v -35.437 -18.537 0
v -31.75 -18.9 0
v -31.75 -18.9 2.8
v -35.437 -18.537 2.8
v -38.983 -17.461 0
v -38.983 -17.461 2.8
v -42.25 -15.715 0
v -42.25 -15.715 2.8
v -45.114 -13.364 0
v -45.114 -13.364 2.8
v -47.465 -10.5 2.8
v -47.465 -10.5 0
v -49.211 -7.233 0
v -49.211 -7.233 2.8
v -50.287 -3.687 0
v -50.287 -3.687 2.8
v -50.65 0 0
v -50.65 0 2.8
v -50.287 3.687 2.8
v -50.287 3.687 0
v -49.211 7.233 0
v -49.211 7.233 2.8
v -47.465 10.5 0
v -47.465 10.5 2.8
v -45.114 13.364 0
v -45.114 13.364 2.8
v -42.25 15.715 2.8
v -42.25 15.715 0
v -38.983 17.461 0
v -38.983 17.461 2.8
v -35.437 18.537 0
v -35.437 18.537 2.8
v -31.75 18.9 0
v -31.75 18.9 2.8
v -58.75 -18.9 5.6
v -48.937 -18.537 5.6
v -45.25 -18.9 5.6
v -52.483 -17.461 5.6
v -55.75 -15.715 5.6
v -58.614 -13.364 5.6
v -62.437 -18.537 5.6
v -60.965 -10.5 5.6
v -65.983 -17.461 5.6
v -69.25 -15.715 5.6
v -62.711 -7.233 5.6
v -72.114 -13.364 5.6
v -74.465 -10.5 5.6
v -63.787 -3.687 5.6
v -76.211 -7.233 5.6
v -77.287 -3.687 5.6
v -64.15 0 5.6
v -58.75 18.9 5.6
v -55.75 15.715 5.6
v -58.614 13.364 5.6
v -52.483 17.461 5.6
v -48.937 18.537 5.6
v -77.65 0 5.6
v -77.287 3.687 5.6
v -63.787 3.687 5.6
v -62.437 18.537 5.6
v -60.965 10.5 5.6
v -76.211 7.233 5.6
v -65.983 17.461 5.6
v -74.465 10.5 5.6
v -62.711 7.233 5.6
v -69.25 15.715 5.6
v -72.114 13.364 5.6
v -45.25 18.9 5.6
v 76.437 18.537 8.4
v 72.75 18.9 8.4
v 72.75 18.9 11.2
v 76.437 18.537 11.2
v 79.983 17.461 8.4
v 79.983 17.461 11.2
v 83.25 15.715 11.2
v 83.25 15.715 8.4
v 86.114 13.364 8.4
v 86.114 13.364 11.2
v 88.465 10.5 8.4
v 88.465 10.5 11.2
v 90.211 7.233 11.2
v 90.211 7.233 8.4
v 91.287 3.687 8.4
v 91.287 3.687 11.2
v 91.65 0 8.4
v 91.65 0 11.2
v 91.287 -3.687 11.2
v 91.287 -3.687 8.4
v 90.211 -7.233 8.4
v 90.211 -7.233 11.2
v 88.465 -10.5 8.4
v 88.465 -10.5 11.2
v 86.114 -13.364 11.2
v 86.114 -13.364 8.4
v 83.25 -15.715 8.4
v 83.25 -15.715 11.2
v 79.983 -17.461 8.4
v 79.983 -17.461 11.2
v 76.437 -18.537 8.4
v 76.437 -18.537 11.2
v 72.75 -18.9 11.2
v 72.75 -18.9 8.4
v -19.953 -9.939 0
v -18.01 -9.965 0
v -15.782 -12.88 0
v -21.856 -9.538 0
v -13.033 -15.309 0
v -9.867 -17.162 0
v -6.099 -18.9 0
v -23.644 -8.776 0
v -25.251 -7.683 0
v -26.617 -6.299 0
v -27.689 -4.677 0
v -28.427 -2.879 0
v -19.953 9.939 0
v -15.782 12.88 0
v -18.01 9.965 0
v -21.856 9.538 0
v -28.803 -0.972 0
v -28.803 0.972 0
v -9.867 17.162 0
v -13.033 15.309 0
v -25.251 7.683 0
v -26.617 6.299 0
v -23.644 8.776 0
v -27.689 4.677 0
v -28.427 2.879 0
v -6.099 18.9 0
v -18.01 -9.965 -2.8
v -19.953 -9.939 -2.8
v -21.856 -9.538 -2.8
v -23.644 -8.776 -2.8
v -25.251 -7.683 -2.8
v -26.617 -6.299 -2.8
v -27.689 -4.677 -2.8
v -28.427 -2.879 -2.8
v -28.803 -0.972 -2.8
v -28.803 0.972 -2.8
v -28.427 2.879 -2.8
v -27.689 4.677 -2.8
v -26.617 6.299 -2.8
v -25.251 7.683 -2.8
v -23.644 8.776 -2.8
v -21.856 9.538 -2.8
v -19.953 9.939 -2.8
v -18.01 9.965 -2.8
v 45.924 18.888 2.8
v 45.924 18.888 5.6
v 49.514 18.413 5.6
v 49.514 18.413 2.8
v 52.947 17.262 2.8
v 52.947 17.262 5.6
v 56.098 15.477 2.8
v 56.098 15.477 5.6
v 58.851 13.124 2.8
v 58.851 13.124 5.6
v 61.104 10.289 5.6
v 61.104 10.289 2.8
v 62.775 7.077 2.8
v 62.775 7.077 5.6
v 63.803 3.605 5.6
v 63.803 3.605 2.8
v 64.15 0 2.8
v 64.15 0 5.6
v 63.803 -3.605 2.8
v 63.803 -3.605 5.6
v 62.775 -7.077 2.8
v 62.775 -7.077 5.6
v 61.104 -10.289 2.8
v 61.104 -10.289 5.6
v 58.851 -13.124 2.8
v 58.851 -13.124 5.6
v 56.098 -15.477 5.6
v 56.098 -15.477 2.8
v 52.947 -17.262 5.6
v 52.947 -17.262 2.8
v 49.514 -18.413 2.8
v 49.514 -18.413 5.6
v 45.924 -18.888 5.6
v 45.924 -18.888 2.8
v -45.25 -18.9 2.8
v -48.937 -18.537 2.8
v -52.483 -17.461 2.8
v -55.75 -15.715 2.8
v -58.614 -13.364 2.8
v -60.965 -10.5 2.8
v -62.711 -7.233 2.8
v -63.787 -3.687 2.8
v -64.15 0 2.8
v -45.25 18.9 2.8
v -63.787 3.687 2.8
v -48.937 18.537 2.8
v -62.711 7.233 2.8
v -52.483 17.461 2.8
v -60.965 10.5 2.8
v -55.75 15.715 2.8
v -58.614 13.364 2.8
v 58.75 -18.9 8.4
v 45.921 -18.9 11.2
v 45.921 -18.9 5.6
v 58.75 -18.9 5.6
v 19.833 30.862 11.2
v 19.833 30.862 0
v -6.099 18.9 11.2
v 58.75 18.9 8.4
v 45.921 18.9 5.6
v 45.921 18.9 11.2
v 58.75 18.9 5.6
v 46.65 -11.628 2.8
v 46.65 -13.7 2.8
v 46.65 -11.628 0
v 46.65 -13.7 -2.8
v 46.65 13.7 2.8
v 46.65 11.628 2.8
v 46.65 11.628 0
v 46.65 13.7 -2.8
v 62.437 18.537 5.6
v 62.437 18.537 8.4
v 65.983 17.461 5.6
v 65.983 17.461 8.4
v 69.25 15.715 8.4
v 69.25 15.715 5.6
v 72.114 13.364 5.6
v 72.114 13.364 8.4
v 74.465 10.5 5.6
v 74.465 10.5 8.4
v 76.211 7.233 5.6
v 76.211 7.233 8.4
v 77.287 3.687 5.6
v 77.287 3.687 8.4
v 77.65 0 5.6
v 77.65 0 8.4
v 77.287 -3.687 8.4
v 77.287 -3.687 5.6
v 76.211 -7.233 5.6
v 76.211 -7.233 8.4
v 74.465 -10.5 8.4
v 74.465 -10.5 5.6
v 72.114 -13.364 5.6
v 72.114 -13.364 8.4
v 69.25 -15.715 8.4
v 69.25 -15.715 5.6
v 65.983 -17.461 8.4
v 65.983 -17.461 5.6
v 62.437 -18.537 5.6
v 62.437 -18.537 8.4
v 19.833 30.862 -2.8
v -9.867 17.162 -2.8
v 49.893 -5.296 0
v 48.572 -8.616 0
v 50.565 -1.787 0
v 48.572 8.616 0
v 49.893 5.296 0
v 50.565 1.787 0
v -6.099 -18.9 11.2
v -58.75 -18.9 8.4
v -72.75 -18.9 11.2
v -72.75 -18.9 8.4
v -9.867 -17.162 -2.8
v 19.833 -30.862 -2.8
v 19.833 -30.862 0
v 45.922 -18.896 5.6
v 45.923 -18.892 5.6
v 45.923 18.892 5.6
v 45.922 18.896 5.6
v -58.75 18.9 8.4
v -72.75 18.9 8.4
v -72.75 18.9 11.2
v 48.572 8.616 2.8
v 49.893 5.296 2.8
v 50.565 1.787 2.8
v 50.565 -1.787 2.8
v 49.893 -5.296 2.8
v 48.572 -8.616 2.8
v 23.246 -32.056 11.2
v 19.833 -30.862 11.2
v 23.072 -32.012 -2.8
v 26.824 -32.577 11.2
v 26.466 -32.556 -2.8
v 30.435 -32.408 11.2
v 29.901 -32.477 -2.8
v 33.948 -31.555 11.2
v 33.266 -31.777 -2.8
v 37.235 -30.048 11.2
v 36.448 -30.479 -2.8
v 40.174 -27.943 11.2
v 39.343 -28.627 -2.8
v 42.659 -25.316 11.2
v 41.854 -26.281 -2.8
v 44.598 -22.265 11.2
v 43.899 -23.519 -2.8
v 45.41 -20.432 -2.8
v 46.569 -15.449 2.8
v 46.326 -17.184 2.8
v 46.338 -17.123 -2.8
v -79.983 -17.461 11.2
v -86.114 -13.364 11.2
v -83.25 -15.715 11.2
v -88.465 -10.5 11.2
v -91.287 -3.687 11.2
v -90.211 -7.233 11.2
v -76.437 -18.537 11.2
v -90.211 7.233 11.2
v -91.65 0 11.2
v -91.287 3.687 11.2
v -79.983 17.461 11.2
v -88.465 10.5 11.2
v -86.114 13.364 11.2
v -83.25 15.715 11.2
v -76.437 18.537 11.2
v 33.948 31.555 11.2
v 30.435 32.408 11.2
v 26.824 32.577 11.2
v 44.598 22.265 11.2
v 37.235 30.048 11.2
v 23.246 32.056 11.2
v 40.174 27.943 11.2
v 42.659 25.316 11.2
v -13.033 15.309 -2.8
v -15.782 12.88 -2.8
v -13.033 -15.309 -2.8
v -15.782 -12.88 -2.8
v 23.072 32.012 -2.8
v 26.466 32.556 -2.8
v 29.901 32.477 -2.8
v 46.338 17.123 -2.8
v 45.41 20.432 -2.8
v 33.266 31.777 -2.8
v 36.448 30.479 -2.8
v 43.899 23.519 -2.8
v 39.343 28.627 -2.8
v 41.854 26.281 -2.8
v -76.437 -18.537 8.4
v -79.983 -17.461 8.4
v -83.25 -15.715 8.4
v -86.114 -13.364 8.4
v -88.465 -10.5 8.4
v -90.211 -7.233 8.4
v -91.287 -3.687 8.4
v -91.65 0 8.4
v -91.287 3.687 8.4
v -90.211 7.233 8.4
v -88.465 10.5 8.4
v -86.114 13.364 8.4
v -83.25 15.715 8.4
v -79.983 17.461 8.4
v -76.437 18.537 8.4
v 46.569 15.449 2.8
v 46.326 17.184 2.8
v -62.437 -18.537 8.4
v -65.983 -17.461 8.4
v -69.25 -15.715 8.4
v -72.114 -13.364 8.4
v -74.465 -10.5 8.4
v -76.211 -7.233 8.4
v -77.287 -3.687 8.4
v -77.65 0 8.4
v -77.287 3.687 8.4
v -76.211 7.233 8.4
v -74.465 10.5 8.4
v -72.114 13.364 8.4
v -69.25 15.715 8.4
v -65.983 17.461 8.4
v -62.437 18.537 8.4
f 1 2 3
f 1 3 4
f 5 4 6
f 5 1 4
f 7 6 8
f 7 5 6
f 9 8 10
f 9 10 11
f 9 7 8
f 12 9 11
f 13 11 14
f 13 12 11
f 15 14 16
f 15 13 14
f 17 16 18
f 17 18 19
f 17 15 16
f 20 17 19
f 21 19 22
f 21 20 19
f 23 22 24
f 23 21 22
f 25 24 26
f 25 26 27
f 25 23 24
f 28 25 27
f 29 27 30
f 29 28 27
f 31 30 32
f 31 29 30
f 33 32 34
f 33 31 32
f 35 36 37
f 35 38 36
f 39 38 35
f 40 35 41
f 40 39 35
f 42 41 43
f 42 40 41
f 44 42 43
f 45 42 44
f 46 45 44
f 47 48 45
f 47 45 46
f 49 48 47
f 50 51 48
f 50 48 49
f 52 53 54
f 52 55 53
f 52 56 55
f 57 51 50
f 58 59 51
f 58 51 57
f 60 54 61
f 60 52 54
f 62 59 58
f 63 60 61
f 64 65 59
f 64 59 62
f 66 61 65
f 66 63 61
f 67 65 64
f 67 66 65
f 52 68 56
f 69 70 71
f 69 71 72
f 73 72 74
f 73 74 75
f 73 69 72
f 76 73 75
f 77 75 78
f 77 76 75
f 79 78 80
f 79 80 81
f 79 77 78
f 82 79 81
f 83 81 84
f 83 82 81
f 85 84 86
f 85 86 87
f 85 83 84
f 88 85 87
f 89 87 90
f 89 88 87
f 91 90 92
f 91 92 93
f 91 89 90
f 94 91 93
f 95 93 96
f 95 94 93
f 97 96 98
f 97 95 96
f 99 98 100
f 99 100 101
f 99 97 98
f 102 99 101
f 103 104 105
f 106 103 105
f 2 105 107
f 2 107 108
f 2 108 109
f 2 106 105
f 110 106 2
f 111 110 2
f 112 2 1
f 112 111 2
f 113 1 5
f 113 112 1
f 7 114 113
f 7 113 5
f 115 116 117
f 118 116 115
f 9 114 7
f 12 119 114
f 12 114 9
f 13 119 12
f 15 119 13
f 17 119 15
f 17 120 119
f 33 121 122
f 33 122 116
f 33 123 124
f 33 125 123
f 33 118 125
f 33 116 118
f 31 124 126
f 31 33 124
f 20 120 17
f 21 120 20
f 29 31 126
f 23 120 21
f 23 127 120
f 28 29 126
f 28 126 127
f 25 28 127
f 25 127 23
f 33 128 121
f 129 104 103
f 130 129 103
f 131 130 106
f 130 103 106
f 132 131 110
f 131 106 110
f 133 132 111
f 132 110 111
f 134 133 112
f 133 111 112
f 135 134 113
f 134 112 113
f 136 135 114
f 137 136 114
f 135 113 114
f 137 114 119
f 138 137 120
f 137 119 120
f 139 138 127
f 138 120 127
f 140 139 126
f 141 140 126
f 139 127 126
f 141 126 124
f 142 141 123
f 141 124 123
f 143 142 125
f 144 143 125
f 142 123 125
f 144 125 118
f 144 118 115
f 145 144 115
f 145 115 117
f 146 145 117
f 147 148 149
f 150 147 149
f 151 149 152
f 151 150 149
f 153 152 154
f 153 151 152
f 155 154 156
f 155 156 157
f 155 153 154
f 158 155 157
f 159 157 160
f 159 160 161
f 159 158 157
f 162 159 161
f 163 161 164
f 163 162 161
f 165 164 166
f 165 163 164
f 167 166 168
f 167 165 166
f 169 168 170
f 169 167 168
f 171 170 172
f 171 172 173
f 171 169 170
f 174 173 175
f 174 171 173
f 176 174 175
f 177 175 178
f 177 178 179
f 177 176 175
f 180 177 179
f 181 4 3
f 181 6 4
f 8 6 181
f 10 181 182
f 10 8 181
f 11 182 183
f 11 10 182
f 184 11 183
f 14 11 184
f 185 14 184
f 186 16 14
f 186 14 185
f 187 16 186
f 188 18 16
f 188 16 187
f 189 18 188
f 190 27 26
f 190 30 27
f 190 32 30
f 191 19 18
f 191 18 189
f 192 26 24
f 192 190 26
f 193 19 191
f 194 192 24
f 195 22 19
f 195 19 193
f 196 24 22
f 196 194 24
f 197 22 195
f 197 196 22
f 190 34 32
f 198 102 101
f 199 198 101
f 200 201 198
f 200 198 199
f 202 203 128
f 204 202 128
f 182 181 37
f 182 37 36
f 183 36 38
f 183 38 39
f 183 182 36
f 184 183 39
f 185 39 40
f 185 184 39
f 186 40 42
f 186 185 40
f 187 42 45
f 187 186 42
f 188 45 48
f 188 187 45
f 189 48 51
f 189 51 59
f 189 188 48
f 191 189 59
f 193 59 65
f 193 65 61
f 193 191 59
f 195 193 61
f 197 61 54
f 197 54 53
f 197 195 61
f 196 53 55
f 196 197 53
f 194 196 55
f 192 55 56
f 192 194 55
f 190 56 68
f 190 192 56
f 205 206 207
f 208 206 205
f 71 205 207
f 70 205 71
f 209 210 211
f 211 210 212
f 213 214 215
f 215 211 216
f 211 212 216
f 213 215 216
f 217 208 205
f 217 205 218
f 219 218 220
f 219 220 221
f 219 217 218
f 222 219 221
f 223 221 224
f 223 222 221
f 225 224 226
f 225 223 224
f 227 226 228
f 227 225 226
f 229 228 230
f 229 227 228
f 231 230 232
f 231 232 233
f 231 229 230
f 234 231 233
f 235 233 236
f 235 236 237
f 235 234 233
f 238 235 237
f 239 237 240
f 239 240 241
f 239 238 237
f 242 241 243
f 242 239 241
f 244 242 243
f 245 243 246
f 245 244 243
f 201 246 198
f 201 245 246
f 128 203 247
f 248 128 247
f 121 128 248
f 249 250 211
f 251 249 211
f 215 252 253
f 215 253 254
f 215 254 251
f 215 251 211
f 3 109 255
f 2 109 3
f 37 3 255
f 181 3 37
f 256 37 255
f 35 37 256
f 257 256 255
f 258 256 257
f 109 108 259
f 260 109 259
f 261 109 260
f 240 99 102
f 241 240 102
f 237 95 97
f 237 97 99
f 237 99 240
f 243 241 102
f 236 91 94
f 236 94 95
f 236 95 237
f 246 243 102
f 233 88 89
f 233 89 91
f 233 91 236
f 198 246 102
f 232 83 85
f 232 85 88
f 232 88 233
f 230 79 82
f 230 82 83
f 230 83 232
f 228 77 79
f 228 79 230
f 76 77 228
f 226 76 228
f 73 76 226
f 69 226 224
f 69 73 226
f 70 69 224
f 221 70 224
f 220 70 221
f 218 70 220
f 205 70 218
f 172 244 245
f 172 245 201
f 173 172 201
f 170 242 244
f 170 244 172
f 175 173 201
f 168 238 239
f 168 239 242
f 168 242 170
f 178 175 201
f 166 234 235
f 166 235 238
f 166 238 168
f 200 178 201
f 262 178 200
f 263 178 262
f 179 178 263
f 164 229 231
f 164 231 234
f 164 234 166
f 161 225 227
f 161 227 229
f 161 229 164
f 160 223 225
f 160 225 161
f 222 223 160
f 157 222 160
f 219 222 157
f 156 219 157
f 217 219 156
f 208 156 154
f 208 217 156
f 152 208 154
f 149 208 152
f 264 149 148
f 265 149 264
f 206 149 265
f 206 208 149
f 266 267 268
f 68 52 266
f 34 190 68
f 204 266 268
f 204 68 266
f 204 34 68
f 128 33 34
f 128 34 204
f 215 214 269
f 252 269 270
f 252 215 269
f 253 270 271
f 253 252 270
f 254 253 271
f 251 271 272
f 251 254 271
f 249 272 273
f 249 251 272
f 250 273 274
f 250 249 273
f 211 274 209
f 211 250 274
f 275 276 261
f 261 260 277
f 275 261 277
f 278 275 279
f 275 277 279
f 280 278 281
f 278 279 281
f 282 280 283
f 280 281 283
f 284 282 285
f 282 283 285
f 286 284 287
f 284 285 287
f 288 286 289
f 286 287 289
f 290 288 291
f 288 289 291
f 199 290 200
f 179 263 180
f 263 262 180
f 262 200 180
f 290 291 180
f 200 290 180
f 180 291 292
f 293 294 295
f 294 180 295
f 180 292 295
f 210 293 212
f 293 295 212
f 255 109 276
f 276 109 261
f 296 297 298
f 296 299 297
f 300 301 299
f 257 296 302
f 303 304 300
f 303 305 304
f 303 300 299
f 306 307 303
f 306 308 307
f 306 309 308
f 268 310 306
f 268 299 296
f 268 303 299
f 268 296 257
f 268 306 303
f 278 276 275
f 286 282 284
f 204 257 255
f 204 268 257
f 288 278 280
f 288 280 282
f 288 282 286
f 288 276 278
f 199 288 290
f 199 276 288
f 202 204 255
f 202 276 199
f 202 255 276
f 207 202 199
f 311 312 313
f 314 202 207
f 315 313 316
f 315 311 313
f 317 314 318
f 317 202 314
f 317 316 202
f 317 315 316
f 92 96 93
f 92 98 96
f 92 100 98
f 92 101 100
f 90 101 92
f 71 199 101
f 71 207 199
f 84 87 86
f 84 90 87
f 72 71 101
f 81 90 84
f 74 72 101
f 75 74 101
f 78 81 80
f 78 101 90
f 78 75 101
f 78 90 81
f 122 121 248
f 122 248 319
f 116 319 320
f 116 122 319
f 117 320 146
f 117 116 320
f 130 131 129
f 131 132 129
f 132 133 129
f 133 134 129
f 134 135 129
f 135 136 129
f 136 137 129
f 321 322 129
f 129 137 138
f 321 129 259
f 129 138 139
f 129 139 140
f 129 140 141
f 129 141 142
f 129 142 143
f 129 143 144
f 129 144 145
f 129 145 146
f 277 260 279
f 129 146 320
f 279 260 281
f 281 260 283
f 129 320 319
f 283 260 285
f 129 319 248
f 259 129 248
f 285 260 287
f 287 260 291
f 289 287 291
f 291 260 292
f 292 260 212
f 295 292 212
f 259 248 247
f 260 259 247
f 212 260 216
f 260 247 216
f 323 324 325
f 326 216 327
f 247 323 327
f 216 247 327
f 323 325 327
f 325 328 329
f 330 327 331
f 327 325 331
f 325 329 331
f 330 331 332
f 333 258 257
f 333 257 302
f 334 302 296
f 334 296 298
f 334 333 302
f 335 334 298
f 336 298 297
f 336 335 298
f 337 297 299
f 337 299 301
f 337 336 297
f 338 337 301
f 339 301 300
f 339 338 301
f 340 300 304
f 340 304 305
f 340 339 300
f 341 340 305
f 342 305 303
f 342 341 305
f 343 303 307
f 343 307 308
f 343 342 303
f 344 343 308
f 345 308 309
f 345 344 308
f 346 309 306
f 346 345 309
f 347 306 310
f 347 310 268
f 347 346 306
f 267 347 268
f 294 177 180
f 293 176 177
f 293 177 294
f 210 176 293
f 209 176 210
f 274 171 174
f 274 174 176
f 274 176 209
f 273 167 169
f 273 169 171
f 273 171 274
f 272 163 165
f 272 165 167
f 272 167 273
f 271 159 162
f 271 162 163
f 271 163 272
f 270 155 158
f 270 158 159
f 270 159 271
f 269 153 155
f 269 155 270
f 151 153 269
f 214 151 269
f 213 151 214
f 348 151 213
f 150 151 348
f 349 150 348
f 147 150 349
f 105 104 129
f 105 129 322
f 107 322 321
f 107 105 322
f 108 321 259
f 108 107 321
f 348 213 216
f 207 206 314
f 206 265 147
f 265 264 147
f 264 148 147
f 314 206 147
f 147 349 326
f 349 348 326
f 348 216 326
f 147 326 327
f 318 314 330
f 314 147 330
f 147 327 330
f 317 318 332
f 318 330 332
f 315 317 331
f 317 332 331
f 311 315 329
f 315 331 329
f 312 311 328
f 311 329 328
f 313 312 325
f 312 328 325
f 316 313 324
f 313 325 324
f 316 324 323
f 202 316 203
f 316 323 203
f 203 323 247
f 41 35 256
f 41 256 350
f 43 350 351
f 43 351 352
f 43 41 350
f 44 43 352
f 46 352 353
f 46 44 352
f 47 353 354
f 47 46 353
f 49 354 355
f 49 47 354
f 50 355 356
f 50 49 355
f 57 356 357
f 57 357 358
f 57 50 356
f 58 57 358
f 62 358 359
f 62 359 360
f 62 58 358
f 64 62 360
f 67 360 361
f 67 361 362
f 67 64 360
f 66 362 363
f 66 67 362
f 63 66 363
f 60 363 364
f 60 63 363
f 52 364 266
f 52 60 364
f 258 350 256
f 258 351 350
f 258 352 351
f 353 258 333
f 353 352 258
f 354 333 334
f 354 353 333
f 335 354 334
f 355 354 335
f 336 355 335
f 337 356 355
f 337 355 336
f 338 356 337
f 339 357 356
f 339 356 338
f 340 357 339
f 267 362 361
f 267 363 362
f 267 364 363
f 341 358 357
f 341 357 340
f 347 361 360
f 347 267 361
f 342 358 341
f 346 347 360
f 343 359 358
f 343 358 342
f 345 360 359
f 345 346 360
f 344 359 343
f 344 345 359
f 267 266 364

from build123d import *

# Parameters (mm, degrees)
BOSS_EXTRUDE1_DEPTH = 2.8
BOSS_EXTRUDE5_DEPTH = 2.8
BOSS_EXTRUDE2_DEPTH = 2.8
BOSS_EXTRUDE3_DEPTH = 2.8
BOSS_EXTRUDE4_DEPTH = 2.8
BOSS_EXTRUDE6_DEPTH = 11.2
BOSS_EXTRUDE7_START = -2.8
BOSS_EXTRUDE7_DEPTH = 2.8


with BuildPart() as part:
    # Sketch1 → Boss-Extrude1 (new body)
    with BuildSketch(Plane.XY):
        with BuildLine():
            Line((-31.75, 18.9), (31.75, 18.9))
            ThreePointArc((31.75, 18.9), (50.65, 0), (31.75, -18.9))
            Line((31.75, -18.9), (-31.75, -18.9))
            ThreePointArc((-31.75, -18.9), (-50.65, 0), (-31.75, 18.9))
        make_face()
    extrude(amount=BOSS_EXTRUDE1_DEPTH)

    # Sketch5 → Boss-Extrude5 (add)
    with BuildSketch(Plane(origin=(0, 0, 0), x_dir=(-1, 0, 0), z_dir=(0, 0, -1))):
        with BuildLine():
            Line((-46.65, -13.7), (-46.65, 13.7))
            ThreePointArc((-46.65, 13.7), (-37.937921505, 29.619053219), (-19.833465037, 30.862123242))
            Line((-19.833465037, 30.862123242), (9.866534963, 17.162123242))
            ThreePointArc((9.866534963, 17.162123242), (20.85, 0), (9.866534963, -17.162123242))
            Line((9.866534963, -17.162123242), (-19.833465037, -30.862123242))
            ThreePointArc((-19.833465037, -30.862123242), (-37.937921505, -29.619053219), (-46.65, -13.7))
        make_face()
    extrude(amount=BOSS_EXTRUDE5_DEPTH)

    # Sketch2 → Boss-Extrude2 (add)
    with BuildSketch(Plane.XY.offset(2.8)):
        with BuildLine():
            Line((-45.25, 18.9), (45.25, 18.9))
            ThreePointArc((45.25, 18.9), (64.15, 0), (45.25, -18.9))
            Line((45.25, -18.9), (-45.25, -18.9))
            ThreePointArc((-45.25, -18.9), (-64.15, 0), (-45.25, 18.9))
        make_face()
    extrude(amount=BOSS_EXTRUDE2_DEPTH)

    # Sketch3 → Boss-Extrude3 (add)
    with BuildSketch(Plane.XY.offset(5.6)):
        with BuildLine():
            Line((-58.75, 18.9), (58.75, 18.9))
            ThreePointArc((58.75, 18.9), (77.65, 0), (58.75, -18.9))
            Line((58.75, -18.9), (-58.75, -18.9))
            ThreePointArc((-58.75, -18.9), (-77.65, 0), (-58.75, 18.9))
        make_face()
    extrude(amount=BOSS_EXTRUDE3_DEPTH)

    # Sketch4 → Boss-Extrude4 (add)
    with BuildSketch(Plane.XY.offset(8.4)):
        with BuildLine():
            Line((-72.75, 18.9), (72.75, 18.9))
            ThreePointArc((72.75, 18.9), (91.65, 0), (72.75, -18.9))
            Line((72.75, -18.9), (-72.75, -18.9))
            ThreePointArc((-72.75, -18.9), (-91.65, 0), (-72.75, 18.9))
        make_face()
    extrude(amount=BOSS_EXTRUDE4_DEPTH)

    # Sketch7 → Boss-Extrude6 (add)
    with BuildSketch(Plane.XY):
        with BuildLine():
            Line((31.75, -18.9), (-6.099021116, -18.9))
            Line((-6.099021116, -18.9), (19.833465037, -30.862123242))
            ThreePointArc((19.833465037, -30.862123242), (37.937921505, -29.619053219), (46.65, -13.7))
            Line((46.65, -13.7), (46.65, -11.627553483))
            ThreePointArc((46.65, -11.627553483), (40.040031338, -16.984857386), (31.75, -18.9))
        make_face()
        with BuildLine():
            Line((46.65, 11.627553483), (46.65, 13.7))
            ThreePointArc((46.65, 13.7), (37.937921505, 29.619053219), (19.833465037, 30.862123242))
            Line((19.833465037, 30.862123242), (-6.099021116, 18.9))
            Line((-6.099021116, 18.9), (31.75, 18.9))
            ThreePointArc((31.75, 18.9), (40.040031338, 16.984857386), (46.65, 11.627553483))
        make_face()
    extrude(amount=BOSS_EXTRUDE6_DEPTH)

    # Sketch10 → Boss-Extrude7 (add)
    with BuildSketch(Plane(origin=(0, 0, -2.8), x_dir=(-1, 0, 0), z_dir=(0, 0, -1)).offset(BOSS_EXTRUDE7_START)):
        with BuildLine():
            ThreePointArc((18.009763314, -9.964637591), (28.85, 0), (18.009763314, 9.964637591))
            ThreePointArc((18.009763314, 9.964637591), (20.85, 0), (18.009763314, -9.964637591))
        make_face()
    extrude(amount=BOSS_EXTRUDE7_DEPTH)


solid = part.part
